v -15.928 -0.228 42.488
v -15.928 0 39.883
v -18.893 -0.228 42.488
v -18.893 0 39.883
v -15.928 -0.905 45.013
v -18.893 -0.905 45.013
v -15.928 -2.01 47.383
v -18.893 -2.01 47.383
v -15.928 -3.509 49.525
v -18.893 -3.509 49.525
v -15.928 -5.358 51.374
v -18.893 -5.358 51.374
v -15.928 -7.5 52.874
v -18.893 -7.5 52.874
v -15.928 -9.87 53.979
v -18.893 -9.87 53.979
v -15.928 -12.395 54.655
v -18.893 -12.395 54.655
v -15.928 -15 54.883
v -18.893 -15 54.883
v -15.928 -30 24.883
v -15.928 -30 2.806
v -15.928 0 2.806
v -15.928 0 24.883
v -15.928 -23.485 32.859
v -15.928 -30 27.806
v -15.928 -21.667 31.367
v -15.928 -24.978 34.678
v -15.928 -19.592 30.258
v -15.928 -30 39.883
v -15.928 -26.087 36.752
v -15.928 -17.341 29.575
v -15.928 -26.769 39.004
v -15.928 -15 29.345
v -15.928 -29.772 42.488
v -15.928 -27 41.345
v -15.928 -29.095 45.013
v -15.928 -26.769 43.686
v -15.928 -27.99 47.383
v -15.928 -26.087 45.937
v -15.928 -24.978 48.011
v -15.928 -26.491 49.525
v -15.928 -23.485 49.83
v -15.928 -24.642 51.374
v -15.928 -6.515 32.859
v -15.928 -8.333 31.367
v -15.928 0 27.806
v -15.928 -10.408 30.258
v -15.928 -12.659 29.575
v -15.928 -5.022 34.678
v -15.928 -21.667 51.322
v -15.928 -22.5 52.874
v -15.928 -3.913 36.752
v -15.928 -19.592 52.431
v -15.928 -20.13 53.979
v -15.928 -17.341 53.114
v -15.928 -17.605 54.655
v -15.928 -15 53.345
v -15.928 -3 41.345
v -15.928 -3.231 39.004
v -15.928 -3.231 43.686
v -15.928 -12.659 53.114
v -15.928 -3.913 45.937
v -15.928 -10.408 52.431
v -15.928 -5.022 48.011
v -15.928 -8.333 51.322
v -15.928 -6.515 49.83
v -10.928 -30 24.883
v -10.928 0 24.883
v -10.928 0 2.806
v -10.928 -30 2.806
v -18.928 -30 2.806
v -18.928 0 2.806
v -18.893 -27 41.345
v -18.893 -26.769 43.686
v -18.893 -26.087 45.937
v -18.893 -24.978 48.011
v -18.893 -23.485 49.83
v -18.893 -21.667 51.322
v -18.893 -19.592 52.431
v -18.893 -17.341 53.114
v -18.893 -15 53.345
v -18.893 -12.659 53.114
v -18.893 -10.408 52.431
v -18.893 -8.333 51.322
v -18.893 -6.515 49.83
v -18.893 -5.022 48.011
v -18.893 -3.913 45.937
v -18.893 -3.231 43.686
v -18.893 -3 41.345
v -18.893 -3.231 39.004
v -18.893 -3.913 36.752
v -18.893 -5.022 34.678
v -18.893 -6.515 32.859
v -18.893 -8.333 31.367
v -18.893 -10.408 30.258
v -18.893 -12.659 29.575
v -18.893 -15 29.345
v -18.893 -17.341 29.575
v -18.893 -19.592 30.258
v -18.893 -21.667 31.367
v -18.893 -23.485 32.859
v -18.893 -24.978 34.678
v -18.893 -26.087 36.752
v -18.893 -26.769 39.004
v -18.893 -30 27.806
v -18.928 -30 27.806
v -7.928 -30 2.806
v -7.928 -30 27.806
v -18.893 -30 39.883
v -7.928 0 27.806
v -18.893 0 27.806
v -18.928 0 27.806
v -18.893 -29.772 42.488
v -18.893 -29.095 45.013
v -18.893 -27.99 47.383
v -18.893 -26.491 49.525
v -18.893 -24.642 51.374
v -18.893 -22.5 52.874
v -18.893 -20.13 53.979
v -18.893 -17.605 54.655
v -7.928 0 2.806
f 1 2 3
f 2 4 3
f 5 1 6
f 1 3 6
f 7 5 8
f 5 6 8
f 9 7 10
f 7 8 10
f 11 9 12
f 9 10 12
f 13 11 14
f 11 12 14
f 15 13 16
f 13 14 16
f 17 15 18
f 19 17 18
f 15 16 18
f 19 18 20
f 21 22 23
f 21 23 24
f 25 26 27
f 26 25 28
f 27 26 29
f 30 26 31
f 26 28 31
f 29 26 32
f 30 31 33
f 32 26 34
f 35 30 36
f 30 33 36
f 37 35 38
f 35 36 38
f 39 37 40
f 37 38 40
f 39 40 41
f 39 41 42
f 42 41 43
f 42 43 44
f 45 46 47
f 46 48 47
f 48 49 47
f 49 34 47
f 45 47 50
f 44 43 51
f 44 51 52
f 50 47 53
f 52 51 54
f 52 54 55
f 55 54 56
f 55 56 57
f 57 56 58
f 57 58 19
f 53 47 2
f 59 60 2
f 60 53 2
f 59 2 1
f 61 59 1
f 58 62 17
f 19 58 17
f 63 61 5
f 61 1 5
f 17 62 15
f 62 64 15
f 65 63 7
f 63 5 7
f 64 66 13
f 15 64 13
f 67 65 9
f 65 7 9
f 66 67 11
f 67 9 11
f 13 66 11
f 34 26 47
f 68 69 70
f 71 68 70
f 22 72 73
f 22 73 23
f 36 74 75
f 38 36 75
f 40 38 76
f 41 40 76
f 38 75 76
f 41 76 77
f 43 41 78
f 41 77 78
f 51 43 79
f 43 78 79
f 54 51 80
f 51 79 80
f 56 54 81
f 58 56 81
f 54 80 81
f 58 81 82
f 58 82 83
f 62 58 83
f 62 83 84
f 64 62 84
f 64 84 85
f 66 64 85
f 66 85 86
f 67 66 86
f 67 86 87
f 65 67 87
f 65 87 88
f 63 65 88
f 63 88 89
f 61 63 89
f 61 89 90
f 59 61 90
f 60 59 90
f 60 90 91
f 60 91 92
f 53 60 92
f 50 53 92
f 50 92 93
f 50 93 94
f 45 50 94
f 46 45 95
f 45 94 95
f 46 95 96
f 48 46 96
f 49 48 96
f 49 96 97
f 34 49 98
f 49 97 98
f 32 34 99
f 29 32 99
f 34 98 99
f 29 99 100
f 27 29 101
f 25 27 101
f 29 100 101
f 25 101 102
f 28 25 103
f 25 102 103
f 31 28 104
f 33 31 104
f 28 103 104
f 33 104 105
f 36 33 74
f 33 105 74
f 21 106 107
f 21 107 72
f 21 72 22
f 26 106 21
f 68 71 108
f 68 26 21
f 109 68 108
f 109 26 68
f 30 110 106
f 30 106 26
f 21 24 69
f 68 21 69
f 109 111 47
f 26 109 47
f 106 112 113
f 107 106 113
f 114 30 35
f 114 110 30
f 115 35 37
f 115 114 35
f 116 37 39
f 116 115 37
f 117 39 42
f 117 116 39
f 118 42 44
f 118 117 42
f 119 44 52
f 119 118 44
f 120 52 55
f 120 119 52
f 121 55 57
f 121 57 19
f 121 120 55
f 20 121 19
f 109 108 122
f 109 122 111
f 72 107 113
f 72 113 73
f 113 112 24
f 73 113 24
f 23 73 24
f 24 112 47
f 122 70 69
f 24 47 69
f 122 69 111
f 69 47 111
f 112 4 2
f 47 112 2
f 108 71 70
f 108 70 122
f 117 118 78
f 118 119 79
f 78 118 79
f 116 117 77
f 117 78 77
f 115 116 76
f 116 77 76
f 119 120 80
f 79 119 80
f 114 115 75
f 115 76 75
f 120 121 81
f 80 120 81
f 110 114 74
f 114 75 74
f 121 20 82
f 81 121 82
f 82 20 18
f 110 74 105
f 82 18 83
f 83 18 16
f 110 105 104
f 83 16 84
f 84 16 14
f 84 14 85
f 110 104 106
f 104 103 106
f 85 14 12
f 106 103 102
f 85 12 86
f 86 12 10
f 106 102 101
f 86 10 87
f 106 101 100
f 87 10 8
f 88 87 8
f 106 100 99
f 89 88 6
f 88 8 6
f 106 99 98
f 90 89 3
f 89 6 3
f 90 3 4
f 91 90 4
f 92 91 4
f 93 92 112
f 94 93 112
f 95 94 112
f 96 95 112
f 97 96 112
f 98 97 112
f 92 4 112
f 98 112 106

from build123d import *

# Parameters (mm, degrees)
F1_DEPTH = 30
F2_R     = 12
F3_DEPTH = 25
F4_R     = 14.99999
F5_DEPTH = 7.3296


# Not quite as in the source:
# - a fillet or chamfer is up to 0.001 mm smaller than in the source, because OpenCascade refuses the exact size


with BuildPart() as f1:
    # F0 (on Front) → F1 (new body)
    with BuildSketch(Plane.XZ):
        Polygon((-18.8925201073, 27.8060024955), (-18.9275150057, 27.8060024955), (-18.9275150057, 2.8060024955), (-15.9275150057, 2.8060024955), (-15.9275150057, 24.8831361532), (-10.9275150057, 24.8831361532), (-10.9275150057, 2.8060024955), (-7.9275150057, 2.8060024955), (-7.9275150057, 27.8060024955), (-10.9275150057, 27.8060024955), (-15.9275150057, 27.8060024955), (-15.9275150057, 54.8831361532), (-18.8925201073, 54.8831361532), align=None)
    extrude(amount=F1_DEPTH)

    # F2 (on face) → F3 (cut)
    with BuildSketch(Plane(origin=(-18.8925201073, 0, 0), x_dir=(0, -1, 0), z_dir=(-1, 0, 0))):
        with Locations((15, 41.3446361532)):
            Circle(F2_R)
    extrude(amount=-F3_DEPTH, mode=Mode.SUBTRACT)

    # F4 (radius 15 in the source; OpenCascade refuses exactly that, so slightly less here)
    f4_edges = [f1.edges().sort_by_distance(p)[0] for p in [
        (-17.410018, 0, 54.883136),
        (-17.410018, -30, 54.883136),
    ]]
    fillet(f4_edges, radius=F4_R)

    # F2 (on face) → F5 (cut)
    with BuildSketch(Plane(origin=(-18.8925201073, 0, 0), x_dir=(0, -1, 0), z_dir=(-1, 0, 0))):
        with Locations((15, 41.3446361532)):
            Circle(F2_R)
    extrude(amount=-F5_DEPTH, mode=Mode.SUBTRACT)


solid = f1.part
